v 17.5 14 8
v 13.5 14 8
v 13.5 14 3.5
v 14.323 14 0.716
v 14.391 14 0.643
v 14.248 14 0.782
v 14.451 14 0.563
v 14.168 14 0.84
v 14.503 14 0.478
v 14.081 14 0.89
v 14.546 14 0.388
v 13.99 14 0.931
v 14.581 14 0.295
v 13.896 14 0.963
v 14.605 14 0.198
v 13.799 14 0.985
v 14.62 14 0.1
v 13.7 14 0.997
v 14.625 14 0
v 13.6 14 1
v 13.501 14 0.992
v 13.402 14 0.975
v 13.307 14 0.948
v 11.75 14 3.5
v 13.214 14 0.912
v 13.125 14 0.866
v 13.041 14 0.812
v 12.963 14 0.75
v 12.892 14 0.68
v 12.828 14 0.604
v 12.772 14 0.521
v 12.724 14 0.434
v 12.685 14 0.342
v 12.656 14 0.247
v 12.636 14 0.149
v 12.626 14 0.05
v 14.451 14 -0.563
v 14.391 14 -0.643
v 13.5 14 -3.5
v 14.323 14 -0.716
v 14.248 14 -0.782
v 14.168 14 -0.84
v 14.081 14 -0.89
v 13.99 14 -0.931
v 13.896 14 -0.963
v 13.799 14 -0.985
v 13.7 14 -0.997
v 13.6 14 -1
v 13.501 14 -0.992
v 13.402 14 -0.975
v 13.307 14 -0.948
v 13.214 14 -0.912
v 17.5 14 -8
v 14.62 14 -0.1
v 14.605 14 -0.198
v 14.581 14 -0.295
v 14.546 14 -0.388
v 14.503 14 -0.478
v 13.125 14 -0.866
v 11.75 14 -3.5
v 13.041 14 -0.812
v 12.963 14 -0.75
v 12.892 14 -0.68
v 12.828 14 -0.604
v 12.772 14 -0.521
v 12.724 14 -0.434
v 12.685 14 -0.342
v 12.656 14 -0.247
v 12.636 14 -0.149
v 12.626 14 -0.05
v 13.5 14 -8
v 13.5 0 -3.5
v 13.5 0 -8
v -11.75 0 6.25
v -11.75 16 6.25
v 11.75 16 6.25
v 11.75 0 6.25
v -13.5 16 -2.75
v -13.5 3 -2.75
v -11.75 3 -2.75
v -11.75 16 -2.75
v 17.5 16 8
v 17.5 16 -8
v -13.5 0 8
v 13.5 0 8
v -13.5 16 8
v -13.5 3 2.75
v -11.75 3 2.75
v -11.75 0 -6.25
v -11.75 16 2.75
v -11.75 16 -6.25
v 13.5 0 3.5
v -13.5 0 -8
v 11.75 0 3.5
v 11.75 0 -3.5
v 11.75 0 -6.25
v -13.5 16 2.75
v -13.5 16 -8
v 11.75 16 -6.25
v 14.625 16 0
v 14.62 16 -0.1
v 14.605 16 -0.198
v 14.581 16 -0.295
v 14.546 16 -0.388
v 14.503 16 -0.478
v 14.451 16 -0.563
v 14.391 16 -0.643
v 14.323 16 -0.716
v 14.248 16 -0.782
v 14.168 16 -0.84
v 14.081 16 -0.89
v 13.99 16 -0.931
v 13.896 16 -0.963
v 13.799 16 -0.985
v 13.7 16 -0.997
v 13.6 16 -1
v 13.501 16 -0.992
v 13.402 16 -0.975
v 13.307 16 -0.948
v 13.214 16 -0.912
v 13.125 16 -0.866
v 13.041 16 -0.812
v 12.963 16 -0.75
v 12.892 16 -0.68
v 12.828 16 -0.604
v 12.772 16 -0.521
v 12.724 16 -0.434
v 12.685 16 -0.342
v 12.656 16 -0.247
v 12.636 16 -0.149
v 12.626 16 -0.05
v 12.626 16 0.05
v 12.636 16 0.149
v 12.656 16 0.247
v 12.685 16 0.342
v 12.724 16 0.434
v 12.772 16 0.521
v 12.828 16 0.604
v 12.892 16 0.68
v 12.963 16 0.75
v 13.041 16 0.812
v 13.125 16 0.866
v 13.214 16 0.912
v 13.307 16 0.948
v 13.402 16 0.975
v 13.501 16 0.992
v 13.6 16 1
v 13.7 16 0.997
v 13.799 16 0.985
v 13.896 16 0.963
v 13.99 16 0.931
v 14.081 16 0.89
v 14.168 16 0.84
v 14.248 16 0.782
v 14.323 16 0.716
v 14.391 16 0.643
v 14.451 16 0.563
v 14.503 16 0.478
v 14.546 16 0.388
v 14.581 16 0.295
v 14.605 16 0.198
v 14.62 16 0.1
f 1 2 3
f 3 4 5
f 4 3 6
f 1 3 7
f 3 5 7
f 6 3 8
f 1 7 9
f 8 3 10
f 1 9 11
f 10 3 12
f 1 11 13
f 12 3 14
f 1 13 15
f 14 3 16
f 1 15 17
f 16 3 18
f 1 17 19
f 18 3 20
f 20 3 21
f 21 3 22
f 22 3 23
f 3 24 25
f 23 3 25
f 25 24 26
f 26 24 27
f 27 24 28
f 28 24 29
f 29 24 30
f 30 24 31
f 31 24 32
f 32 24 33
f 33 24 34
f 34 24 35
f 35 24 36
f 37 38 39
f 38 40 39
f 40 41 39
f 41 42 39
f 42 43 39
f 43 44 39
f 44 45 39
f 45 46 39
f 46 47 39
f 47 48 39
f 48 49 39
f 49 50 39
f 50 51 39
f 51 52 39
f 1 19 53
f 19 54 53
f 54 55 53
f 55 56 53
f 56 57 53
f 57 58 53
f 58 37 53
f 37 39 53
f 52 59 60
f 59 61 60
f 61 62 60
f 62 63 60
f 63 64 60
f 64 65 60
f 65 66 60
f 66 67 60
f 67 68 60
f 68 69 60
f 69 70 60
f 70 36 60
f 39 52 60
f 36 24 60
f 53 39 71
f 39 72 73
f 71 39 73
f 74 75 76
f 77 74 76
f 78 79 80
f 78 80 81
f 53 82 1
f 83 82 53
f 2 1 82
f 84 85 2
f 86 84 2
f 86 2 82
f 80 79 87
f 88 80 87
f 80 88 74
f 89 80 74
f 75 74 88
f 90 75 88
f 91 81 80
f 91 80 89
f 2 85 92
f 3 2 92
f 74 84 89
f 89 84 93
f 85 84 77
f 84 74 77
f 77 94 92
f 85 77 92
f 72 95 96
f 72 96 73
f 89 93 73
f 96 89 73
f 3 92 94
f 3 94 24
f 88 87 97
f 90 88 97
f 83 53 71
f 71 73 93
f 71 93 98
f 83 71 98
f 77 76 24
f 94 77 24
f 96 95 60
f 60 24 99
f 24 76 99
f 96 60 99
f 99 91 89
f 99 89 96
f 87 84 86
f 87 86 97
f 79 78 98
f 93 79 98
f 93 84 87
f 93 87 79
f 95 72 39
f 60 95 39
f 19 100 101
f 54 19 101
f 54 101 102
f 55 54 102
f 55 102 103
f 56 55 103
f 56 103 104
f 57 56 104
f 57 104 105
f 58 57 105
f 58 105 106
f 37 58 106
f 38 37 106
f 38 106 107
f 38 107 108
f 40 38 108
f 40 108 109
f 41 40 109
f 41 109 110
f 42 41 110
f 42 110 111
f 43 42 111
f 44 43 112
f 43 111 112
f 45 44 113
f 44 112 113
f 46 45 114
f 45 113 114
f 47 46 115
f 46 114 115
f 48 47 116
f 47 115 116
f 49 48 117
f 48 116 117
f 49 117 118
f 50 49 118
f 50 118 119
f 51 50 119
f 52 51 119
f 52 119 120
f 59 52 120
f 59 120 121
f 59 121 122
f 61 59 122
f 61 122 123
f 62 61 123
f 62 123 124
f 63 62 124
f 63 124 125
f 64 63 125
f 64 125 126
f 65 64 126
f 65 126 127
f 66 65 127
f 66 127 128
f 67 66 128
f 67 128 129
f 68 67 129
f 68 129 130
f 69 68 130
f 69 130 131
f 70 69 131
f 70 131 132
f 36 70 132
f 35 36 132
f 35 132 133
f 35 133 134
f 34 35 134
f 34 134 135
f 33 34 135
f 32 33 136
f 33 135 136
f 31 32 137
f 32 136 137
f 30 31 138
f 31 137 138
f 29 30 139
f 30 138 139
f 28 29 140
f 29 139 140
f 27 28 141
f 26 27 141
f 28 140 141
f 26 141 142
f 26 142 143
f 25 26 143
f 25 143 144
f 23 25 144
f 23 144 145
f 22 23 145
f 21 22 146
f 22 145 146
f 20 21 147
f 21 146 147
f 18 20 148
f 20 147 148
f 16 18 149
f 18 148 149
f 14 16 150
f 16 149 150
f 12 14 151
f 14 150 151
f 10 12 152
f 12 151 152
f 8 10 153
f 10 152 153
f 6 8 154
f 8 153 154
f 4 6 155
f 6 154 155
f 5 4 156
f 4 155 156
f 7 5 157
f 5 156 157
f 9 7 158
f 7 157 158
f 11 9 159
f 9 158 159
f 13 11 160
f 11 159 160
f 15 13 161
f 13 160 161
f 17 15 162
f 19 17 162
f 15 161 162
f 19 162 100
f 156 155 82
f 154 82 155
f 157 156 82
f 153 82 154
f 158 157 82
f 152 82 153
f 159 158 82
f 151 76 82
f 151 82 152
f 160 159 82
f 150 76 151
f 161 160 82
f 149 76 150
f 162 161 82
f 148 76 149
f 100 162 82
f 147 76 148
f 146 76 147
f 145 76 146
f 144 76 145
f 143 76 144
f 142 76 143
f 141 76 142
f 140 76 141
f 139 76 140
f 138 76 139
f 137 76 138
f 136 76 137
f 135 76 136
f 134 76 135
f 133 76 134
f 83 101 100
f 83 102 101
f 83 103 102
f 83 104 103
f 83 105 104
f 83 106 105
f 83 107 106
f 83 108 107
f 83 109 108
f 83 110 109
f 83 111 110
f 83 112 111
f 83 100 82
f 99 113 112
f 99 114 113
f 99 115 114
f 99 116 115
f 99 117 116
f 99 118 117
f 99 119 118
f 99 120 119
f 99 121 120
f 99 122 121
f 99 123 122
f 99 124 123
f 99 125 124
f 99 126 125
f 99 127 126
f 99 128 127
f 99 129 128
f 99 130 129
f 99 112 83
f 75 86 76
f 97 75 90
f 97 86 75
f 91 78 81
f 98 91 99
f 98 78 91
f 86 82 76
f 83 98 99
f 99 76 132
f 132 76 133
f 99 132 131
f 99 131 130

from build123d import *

# Parameters (mm, degrees)
SKETCH1_W           = 27
SKETCH1_H           = 16
BOSS_EXTRUDE1_DEPTH = 16
SKETCH2_W           = 23.5
SKETCH2_H           = 12.5
CUT_EXTRUDE1_DEPTH  = 16
SKETCH3_W           = 5.5
SKETCH3_H           = 13
CUT_EXTRUDE2_DEPTH  = 4
SKETCH4_W           = 16
SKETCH4_H           = 2
BOSS_EXTRUDE2_DEPTH = 4
SKETCH5_R           = 1
CUT_EXTRUDE3_DEPTH  = 17
SKETCH6_W           = 7
SKETCH6_H           = 14
CUT_EXTRUDE4_DEPTH  = 4


with BuildPart() as part:
    # Sketch1 → Boss-Extrude1 (new body)
    with BuildSketch(Plane(origin=(0, 0, 0), x_dir=(1, 0, 0), z_dir=(0, 1, 0))):
        Rectangle(SKETCH1_W, SKETCH1_H)
    extrude(amount=BOSS_EXTRUDE1_DEPTH)

    # Sketch2 → Cut-Extrude1 (cut)
    with BuildSketch(Plane(origin=(0, 16, 0), x_dir=(1, 0, 0), z_dir=(0, 1, 0))):
        Rectangle(SKETCH2_W, SKETCH2_H)
    extrude(amount=-CUT_EXTRUDE1_DEPTH, mode=Mode.SUBTRACT)

    # Sketch3 → Cut-Extrude2 (cut)
    with BuildSketch(Plane.ZY.offset(13.5)):
        with Locations((0, 9.5)):
            Rectangle(SKETCH3_W, SKETCH3_H)
    extrude(amount=-CUT_EXTRUDE2_DEPTH, mode=Mode.SUBTRACT)

    # Sketch4 → Boss-Extrude2 (add)
    with BuildSketch(Plane(origin=(13.5, 0, 0), x_dir=(0, 0, -1), z_dir=(1, 0, 0))):
        with Locations((0, 15)):
            Rectangle(SKETCH4_W, SKETCH4_H)
    extrude(amount=BOSS_EXTRUDE2_DEPTH)

    # Sketch5 → Cut-Extrude3 (cut, through all)
    with BuildSketch(Plane(origin=(0, 16, 0), x_dir=(1, 0, 0), z_dir=(0, 1, 0))):
        with Locations((13.625, 0)):
            Circle(SKETCH5_R)
    extrude(amount=-CUT_EXTRUDE3_DEPTH, mode=Mode.SUBTRACT)

    # Sketch6 → Cut-Extrude4 (cut)
    with BuildSketch(Plane(origin=(13.5, 0, 0), x_dir=(0, 0, -1), z_dir=(1, 0, 0))):
        with Locations((0, 7)):
            Rectangle(SKETCH6_W, SKETCH6_H)
    extrude(amount=-CUT_EXTRUDE4_DEPTH, mode=Mode.SUBTRACT)


solid = part.part
